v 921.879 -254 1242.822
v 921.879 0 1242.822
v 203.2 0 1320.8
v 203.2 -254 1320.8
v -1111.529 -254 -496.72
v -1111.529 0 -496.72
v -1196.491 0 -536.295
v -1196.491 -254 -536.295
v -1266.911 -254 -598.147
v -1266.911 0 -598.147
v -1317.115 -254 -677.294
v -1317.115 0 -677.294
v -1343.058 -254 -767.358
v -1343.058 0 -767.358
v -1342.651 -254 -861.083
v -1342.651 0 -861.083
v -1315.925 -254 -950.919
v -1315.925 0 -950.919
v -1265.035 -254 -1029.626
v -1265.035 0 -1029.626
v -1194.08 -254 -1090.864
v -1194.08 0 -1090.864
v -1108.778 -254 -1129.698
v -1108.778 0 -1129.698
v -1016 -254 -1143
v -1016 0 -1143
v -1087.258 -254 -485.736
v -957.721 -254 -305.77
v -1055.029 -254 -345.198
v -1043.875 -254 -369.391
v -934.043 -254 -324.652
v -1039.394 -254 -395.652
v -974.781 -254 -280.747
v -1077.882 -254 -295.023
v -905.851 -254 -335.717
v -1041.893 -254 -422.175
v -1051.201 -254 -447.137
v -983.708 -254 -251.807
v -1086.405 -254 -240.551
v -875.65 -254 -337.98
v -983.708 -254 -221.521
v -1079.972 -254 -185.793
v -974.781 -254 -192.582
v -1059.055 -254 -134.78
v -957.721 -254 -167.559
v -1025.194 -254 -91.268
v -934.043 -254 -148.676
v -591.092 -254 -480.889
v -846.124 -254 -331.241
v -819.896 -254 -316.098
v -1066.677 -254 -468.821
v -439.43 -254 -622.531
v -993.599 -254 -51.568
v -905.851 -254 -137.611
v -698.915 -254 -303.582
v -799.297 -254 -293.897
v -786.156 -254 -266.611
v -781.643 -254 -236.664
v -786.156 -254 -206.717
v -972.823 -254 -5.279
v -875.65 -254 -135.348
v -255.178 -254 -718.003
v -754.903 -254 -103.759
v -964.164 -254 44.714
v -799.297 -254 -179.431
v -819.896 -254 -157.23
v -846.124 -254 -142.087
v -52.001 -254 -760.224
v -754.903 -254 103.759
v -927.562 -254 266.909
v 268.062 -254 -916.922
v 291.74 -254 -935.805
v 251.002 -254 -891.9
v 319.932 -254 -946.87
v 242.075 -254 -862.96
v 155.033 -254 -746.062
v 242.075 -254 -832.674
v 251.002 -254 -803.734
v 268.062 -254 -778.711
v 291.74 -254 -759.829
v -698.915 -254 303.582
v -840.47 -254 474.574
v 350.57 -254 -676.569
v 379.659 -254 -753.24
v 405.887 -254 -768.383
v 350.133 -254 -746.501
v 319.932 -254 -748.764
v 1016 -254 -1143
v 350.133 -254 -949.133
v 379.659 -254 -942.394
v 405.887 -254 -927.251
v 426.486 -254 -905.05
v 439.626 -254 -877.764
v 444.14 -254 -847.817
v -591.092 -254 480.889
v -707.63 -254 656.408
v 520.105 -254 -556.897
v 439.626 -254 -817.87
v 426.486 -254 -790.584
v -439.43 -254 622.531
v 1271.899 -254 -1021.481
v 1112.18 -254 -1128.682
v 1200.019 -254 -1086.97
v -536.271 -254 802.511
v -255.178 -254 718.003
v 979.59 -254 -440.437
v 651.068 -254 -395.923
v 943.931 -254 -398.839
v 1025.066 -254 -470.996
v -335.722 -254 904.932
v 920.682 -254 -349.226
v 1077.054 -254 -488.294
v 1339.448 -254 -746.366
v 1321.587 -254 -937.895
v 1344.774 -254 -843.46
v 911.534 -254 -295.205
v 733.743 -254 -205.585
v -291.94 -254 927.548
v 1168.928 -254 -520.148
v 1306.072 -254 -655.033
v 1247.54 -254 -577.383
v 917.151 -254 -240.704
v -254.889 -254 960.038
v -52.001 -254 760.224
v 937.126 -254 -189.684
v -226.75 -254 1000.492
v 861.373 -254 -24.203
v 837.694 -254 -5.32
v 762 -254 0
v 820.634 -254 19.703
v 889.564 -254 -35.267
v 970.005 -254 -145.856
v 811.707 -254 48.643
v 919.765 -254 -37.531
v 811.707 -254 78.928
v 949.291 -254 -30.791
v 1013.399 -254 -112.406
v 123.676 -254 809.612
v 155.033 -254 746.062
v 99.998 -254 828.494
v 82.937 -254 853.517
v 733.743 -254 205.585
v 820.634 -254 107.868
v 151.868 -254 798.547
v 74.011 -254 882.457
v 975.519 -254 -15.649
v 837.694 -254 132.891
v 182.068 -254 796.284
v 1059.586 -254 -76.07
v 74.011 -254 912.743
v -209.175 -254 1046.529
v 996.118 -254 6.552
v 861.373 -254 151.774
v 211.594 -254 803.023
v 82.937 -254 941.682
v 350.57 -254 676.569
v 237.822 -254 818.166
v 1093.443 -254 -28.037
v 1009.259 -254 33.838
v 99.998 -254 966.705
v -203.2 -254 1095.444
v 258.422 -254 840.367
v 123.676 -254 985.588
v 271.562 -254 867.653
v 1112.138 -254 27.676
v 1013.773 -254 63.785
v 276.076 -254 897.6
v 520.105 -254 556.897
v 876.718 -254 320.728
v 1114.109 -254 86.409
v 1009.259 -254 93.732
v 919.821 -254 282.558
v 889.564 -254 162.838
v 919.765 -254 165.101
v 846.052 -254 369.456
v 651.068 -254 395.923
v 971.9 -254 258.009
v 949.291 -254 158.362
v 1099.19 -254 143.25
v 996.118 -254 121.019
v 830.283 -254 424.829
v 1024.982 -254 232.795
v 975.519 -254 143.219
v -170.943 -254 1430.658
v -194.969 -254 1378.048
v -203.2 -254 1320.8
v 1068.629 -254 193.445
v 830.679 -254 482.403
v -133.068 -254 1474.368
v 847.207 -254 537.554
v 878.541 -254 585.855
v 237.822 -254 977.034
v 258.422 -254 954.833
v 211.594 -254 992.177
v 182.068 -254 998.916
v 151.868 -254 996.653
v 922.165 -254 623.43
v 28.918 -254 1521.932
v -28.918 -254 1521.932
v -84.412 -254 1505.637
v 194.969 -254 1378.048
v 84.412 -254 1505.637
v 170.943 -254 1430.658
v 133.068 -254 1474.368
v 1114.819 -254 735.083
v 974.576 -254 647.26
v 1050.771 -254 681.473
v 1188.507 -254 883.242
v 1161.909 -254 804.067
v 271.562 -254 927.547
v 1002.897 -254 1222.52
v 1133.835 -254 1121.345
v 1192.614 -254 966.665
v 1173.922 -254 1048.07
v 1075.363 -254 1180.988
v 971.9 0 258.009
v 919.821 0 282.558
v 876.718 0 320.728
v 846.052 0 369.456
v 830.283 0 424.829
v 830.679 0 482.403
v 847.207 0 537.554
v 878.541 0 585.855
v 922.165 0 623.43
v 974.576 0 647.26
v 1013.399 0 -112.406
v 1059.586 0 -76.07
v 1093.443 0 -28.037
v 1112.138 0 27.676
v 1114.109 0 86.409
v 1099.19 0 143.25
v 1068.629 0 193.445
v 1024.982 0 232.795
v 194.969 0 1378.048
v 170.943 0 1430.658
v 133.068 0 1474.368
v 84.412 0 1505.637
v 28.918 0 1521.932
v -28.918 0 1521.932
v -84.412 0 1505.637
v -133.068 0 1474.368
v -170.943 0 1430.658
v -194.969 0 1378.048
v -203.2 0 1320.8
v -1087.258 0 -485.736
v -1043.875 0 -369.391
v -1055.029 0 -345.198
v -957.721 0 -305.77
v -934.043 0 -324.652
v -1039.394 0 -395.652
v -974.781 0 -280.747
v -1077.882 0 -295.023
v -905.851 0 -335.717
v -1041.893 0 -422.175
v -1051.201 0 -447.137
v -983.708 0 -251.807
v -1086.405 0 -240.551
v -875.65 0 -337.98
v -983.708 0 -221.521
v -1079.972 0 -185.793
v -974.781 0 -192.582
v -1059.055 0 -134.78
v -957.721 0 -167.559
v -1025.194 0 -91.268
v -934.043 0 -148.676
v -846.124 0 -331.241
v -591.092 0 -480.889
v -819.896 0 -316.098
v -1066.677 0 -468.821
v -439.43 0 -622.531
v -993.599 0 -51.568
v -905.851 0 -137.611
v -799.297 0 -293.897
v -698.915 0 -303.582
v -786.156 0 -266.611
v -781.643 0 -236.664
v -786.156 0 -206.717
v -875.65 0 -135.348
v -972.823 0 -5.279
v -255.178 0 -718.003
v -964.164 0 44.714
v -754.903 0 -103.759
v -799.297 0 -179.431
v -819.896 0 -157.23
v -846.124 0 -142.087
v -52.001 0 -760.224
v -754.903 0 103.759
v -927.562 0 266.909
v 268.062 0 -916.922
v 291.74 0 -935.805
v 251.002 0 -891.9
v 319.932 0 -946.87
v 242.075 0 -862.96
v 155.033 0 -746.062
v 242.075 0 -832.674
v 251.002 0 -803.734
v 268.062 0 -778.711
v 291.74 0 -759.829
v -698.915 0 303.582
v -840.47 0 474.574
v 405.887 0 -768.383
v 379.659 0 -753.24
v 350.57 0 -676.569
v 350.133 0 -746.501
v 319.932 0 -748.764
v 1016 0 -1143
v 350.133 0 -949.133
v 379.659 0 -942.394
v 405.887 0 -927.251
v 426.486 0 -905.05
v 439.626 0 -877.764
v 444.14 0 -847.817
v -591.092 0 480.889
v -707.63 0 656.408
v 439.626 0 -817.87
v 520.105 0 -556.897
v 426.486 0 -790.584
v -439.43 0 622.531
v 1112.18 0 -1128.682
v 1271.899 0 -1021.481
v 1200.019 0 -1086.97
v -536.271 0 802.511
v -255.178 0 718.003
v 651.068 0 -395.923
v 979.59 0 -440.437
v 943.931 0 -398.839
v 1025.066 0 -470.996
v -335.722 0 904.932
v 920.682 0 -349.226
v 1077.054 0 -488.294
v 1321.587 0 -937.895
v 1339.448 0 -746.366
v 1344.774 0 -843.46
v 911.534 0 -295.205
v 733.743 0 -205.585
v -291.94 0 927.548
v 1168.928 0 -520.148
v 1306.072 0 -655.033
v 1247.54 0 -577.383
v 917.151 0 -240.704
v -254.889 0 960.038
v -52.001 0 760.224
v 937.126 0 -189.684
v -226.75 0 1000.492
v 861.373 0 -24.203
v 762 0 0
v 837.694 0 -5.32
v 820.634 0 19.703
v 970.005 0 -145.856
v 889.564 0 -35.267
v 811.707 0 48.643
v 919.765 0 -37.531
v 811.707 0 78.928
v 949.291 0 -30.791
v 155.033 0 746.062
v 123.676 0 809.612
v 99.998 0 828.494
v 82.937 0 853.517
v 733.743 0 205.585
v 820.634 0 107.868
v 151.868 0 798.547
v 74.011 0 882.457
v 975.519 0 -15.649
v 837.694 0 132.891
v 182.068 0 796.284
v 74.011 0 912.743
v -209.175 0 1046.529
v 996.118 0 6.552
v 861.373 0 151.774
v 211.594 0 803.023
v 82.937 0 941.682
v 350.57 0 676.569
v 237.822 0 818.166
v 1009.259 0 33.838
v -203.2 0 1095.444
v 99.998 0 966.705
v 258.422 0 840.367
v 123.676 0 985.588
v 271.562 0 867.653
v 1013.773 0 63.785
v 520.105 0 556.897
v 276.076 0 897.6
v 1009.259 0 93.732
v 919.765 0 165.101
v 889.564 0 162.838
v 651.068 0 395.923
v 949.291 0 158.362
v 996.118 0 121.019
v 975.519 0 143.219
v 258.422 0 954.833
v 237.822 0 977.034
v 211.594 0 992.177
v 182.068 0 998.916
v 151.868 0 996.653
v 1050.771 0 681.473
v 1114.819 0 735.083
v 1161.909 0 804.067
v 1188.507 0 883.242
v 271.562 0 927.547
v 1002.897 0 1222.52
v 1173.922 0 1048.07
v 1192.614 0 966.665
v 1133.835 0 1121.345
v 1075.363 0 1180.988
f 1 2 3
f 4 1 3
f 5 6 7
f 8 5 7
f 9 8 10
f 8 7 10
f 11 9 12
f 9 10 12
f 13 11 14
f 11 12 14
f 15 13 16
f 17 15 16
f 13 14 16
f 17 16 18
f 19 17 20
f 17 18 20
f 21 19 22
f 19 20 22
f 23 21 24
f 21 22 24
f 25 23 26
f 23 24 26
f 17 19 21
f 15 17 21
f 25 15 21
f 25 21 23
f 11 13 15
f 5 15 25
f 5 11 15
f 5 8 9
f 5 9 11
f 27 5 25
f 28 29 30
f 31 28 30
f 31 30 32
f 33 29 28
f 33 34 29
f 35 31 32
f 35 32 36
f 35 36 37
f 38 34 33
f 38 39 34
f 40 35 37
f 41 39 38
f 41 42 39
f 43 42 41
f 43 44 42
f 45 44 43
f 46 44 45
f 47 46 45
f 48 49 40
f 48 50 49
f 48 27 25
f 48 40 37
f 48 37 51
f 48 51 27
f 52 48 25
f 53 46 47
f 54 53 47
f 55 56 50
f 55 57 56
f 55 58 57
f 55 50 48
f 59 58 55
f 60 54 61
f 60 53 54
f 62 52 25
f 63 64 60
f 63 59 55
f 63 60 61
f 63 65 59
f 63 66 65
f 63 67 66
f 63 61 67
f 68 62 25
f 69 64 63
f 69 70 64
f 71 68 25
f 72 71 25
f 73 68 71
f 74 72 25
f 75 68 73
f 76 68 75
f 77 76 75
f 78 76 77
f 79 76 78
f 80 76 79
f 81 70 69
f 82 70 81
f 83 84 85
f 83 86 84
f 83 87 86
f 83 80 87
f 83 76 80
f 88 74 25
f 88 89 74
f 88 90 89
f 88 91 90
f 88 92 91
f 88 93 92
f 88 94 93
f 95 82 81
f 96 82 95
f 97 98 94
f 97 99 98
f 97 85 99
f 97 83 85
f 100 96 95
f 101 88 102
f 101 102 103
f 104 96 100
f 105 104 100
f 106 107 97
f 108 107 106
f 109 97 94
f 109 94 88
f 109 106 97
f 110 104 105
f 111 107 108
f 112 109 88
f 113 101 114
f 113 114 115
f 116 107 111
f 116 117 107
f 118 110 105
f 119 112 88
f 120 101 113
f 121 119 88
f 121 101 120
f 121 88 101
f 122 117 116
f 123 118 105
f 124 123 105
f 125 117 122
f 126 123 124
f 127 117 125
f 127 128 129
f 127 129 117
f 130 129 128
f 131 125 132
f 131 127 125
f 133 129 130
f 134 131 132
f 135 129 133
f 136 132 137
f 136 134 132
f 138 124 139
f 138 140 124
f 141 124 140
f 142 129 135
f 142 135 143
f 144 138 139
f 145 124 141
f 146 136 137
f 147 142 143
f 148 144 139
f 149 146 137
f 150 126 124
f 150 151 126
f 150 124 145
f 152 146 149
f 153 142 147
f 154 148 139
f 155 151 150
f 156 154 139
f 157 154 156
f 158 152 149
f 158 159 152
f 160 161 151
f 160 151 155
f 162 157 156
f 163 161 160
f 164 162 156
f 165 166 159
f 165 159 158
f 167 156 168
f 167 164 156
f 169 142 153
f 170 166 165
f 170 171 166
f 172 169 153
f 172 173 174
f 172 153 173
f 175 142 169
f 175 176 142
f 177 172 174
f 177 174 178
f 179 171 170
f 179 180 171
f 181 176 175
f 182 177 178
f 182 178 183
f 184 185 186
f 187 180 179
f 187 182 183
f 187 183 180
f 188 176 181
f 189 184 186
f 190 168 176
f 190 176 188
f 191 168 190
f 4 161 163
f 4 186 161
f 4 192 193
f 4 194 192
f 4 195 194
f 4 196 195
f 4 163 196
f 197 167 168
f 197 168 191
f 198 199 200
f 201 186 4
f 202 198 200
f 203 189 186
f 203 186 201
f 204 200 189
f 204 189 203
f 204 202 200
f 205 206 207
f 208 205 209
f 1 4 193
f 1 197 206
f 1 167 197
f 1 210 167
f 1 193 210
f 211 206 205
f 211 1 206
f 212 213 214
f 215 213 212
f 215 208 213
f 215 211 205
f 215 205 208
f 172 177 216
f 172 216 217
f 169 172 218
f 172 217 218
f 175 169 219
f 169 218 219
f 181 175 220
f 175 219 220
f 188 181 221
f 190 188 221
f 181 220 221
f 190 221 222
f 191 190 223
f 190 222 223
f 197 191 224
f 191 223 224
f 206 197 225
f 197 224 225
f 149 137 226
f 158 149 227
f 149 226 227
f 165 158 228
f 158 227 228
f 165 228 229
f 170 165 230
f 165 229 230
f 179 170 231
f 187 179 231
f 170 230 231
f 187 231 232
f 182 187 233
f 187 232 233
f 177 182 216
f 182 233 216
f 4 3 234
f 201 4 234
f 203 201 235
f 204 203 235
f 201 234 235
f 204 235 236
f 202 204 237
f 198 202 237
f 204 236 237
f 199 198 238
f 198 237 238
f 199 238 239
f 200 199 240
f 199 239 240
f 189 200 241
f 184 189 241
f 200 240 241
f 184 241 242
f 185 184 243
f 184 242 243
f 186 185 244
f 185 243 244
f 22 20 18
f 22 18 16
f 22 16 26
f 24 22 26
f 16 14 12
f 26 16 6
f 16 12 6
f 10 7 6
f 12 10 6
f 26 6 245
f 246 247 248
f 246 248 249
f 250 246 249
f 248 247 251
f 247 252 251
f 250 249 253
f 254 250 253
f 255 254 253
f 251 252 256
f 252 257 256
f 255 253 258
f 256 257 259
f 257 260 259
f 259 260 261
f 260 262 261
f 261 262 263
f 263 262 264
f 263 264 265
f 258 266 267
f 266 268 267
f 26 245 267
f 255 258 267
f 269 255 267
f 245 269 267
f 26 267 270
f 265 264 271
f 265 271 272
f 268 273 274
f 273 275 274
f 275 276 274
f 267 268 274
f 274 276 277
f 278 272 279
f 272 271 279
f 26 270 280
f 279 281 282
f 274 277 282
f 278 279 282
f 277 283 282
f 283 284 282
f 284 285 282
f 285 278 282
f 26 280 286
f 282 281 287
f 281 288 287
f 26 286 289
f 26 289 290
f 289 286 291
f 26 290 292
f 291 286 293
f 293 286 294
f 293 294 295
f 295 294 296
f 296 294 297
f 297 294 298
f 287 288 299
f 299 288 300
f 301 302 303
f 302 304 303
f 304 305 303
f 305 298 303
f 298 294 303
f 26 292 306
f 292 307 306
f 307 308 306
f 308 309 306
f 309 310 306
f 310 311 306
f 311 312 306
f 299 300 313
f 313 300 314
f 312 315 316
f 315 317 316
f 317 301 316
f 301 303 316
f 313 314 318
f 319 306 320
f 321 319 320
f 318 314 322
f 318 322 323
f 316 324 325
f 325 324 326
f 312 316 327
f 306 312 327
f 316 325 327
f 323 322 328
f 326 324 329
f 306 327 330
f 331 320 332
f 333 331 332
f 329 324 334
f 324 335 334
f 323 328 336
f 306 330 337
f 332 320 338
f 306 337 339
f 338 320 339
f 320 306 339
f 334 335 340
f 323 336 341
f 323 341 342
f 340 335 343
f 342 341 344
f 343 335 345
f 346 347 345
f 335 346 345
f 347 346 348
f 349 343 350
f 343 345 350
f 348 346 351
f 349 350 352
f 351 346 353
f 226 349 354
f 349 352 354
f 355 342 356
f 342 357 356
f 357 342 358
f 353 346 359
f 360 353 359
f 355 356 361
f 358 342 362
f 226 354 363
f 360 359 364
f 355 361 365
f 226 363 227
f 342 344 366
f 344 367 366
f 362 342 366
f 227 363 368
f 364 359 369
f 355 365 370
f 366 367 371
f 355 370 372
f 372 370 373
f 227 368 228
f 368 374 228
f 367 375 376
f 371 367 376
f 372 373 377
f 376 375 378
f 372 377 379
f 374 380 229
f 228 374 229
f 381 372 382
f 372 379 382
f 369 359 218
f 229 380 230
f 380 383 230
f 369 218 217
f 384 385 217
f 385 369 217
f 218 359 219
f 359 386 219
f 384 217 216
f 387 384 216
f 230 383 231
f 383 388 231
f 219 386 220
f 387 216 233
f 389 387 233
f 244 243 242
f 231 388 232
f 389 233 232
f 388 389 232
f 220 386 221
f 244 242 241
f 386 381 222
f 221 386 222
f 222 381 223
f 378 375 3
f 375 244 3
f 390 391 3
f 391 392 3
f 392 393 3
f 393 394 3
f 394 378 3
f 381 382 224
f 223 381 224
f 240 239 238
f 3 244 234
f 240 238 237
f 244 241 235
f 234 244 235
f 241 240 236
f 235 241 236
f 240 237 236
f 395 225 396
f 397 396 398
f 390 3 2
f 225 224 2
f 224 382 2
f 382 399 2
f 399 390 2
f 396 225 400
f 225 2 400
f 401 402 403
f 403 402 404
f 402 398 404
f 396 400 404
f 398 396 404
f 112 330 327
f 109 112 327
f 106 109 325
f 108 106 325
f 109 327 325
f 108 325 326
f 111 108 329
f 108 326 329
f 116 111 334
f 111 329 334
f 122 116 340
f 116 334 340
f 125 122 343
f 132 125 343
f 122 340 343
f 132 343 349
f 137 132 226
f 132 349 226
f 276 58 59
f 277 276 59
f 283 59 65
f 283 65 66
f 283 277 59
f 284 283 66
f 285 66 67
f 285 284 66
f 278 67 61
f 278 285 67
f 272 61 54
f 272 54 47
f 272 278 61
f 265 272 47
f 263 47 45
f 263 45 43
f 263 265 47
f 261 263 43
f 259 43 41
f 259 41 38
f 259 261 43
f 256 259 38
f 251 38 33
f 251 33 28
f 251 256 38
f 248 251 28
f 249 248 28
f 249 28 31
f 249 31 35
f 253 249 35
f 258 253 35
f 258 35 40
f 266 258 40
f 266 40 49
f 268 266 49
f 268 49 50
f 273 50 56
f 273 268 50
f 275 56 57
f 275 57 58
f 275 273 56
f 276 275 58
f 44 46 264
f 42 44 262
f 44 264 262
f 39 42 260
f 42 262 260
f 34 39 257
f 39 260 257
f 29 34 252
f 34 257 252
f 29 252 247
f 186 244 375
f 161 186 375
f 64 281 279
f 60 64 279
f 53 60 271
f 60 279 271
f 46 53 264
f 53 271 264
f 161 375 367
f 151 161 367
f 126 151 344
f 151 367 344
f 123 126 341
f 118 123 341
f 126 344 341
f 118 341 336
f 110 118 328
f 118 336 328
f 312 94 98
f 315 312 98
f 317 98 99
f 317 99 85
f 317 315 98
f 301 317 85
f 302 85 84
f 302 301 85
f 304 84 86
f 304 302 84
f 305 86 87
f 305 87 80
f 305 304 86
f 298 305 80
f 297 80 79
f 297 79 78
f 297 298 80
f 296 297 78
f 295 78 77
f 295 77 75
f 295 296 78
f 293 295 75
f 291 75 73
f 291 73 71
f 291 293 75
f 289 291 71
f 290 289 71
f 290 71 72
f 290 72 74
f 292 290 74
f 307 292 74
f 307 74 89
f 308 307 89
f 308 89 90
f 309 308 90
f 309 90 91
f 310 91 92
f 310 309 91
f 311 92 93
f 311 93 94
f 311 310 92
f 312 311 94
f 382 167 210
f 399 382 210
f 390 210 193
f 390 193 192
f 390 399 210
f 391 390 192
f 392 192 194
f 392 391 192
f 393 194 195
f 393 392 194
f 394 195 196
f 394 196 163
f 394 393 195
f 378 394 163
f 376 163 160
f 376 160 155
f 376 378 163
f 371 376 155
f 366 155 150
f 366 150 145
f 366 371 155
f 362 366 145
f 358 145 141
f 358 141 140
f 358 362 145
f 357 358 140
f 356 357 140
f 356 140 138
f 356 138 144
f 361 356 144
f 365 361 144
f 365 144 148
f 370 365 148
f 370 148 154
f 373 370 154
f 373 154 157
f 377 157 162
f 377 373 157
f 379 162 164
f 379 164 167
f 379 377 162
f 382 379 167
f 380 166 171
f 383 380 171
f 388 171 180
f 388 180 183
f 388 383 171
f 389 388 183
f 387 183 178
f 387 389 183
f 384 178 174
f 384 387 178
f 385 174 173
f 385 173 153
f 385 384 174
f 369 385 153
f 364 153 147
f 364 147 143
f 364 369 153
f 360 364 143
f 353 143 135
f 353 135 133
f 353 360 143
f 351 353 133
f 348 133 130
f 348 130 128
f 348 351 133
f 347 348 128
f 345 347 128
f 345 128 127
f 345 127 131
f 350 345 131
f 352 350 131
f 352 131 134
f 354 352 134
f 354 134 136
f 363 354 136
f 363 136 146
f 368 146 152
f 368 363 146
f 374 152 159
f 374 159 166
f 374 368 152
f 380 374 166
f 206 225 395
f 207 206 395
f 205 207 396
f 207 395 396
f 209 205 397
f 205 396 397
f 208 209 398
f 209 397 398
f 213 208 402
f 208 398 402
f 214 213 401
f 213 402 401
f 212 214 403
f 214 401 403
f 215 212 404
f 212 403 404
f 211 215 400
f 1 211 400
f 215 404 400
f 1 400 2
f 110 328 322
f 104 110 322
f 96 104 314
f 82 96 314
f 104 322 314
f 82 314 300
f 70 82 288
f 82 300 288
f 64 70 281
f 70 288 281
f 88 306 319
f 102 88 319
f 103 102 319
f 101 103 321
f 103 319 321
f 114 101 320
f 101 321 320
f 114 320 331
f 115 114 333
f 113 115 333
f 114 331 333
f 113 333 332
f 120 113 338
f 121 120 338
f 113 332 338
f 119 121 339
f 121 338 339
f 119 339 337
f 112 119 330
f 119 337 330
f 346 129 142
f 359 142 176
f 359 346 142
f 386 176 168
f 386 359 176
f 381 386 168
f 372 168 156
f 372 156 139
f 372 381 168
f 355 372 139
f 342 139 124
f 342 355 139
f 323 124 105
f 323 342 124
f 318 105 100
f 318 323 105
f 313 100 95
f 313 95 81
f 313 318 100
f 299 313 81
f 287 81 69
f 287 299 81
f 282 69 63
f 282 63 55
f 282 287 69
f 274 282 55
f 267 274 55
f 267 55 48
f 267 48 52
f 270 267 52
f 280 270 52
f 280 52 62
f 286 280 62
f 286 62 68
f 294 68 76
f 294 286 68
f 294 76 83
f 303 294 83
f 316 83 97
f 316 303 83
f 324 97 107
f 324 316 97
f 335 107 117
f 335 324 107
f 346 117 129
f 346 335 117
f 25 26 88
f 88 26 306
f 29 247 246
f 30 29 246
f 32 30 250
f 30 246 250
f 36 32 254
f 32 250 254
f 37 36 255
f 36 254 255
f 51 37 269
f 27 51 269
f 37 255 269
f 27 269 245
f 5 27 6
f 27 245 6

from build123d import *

# Parameters (mm, degrees)
F0_R     = 101.6
F0_R_2   = 762
F1_DEPTH = 254


with BuildPart() as f1:
    # F0 (on Front) → F1 (new body)
    with BuildSketch(Plane.XZ):
        with BuildLine():
            Line((-1016, -1143), (0, -1143))
            Line((0, -1143), (1016, -1143))
            ThreePointArc((1016, -1143), (1344.773524, -843.459579), (1077.054257, -488.293578))
            ThreePointArc((1077.054257, -488.293578), (914.278579, -322.525298), (1013.399338, -112.406))
            ThreePointArc((1013.399338, -112.406), (1114.109174, 86.409357), (971.899747, 258.00917))
            ThreePointArc((971.899747, 258.00917), (828.43173, 453.630149), (974.576156, 647.259812))
            ThreePointArc((974.576156, 647.259812), (1192.613764, 966.664887), (921.878618, 1242.821512))
            Line((921.878618, 1242.821512), (203.2, 1320.8))
            ThreePointArc((203.2, 1320.8), (0, 1524), (-203.2, 1320.8))
            Line((-203.2, 1320.8), (-203.2, 1095.44402))
            ThreePointArc((-203.2, 1095.44402), (-239.588636, 979.408643), (-335.721739, 904.932016))
            ThreePointArc((-335.721739, 904.932016), (-779.370976, 569.378541), (-964.16371, 44.714433))
            ThreePointArc((-964.16371, 44.714433), (-981.76065, -29.074654), (-1025.19406, -91.268068))
            ThreePointArc((-1025.19406, -91.268068), (-1085.054384, -212.952658), (-1055.029073, -345.198181))
            ThreePointArc((-1055.029073, -345.198181), (-1045.725119, -434.962424), (-1111.528835, -496.72045))
            ThreePointArc((-1111.528835, -496.72045), (-1342.650813, -861.083396), (-1016, -1143))
        make_face()
        with Locations((-883.242576, -236.664135)):
            Circle(F0_R, mode=Mode.SUBTRACT)
        with Locations((342.540269, -847.816917)):
            Circle(F0_R, mode=Mode.SUBTRACT)
        Circle(F0_R_2, mode=Mode.SUBTRACT)
        with Locations((912.172568, 63.78532)):
            Circle(F0_R, mode=Mode.SUBTRACT)
        with Locations((174.475745, 897.599897)):
            Circle(F0_R, mode=Mode.SUBTRACT)
    extrude(amount=F1_DEPTH)


solid = f1.part
